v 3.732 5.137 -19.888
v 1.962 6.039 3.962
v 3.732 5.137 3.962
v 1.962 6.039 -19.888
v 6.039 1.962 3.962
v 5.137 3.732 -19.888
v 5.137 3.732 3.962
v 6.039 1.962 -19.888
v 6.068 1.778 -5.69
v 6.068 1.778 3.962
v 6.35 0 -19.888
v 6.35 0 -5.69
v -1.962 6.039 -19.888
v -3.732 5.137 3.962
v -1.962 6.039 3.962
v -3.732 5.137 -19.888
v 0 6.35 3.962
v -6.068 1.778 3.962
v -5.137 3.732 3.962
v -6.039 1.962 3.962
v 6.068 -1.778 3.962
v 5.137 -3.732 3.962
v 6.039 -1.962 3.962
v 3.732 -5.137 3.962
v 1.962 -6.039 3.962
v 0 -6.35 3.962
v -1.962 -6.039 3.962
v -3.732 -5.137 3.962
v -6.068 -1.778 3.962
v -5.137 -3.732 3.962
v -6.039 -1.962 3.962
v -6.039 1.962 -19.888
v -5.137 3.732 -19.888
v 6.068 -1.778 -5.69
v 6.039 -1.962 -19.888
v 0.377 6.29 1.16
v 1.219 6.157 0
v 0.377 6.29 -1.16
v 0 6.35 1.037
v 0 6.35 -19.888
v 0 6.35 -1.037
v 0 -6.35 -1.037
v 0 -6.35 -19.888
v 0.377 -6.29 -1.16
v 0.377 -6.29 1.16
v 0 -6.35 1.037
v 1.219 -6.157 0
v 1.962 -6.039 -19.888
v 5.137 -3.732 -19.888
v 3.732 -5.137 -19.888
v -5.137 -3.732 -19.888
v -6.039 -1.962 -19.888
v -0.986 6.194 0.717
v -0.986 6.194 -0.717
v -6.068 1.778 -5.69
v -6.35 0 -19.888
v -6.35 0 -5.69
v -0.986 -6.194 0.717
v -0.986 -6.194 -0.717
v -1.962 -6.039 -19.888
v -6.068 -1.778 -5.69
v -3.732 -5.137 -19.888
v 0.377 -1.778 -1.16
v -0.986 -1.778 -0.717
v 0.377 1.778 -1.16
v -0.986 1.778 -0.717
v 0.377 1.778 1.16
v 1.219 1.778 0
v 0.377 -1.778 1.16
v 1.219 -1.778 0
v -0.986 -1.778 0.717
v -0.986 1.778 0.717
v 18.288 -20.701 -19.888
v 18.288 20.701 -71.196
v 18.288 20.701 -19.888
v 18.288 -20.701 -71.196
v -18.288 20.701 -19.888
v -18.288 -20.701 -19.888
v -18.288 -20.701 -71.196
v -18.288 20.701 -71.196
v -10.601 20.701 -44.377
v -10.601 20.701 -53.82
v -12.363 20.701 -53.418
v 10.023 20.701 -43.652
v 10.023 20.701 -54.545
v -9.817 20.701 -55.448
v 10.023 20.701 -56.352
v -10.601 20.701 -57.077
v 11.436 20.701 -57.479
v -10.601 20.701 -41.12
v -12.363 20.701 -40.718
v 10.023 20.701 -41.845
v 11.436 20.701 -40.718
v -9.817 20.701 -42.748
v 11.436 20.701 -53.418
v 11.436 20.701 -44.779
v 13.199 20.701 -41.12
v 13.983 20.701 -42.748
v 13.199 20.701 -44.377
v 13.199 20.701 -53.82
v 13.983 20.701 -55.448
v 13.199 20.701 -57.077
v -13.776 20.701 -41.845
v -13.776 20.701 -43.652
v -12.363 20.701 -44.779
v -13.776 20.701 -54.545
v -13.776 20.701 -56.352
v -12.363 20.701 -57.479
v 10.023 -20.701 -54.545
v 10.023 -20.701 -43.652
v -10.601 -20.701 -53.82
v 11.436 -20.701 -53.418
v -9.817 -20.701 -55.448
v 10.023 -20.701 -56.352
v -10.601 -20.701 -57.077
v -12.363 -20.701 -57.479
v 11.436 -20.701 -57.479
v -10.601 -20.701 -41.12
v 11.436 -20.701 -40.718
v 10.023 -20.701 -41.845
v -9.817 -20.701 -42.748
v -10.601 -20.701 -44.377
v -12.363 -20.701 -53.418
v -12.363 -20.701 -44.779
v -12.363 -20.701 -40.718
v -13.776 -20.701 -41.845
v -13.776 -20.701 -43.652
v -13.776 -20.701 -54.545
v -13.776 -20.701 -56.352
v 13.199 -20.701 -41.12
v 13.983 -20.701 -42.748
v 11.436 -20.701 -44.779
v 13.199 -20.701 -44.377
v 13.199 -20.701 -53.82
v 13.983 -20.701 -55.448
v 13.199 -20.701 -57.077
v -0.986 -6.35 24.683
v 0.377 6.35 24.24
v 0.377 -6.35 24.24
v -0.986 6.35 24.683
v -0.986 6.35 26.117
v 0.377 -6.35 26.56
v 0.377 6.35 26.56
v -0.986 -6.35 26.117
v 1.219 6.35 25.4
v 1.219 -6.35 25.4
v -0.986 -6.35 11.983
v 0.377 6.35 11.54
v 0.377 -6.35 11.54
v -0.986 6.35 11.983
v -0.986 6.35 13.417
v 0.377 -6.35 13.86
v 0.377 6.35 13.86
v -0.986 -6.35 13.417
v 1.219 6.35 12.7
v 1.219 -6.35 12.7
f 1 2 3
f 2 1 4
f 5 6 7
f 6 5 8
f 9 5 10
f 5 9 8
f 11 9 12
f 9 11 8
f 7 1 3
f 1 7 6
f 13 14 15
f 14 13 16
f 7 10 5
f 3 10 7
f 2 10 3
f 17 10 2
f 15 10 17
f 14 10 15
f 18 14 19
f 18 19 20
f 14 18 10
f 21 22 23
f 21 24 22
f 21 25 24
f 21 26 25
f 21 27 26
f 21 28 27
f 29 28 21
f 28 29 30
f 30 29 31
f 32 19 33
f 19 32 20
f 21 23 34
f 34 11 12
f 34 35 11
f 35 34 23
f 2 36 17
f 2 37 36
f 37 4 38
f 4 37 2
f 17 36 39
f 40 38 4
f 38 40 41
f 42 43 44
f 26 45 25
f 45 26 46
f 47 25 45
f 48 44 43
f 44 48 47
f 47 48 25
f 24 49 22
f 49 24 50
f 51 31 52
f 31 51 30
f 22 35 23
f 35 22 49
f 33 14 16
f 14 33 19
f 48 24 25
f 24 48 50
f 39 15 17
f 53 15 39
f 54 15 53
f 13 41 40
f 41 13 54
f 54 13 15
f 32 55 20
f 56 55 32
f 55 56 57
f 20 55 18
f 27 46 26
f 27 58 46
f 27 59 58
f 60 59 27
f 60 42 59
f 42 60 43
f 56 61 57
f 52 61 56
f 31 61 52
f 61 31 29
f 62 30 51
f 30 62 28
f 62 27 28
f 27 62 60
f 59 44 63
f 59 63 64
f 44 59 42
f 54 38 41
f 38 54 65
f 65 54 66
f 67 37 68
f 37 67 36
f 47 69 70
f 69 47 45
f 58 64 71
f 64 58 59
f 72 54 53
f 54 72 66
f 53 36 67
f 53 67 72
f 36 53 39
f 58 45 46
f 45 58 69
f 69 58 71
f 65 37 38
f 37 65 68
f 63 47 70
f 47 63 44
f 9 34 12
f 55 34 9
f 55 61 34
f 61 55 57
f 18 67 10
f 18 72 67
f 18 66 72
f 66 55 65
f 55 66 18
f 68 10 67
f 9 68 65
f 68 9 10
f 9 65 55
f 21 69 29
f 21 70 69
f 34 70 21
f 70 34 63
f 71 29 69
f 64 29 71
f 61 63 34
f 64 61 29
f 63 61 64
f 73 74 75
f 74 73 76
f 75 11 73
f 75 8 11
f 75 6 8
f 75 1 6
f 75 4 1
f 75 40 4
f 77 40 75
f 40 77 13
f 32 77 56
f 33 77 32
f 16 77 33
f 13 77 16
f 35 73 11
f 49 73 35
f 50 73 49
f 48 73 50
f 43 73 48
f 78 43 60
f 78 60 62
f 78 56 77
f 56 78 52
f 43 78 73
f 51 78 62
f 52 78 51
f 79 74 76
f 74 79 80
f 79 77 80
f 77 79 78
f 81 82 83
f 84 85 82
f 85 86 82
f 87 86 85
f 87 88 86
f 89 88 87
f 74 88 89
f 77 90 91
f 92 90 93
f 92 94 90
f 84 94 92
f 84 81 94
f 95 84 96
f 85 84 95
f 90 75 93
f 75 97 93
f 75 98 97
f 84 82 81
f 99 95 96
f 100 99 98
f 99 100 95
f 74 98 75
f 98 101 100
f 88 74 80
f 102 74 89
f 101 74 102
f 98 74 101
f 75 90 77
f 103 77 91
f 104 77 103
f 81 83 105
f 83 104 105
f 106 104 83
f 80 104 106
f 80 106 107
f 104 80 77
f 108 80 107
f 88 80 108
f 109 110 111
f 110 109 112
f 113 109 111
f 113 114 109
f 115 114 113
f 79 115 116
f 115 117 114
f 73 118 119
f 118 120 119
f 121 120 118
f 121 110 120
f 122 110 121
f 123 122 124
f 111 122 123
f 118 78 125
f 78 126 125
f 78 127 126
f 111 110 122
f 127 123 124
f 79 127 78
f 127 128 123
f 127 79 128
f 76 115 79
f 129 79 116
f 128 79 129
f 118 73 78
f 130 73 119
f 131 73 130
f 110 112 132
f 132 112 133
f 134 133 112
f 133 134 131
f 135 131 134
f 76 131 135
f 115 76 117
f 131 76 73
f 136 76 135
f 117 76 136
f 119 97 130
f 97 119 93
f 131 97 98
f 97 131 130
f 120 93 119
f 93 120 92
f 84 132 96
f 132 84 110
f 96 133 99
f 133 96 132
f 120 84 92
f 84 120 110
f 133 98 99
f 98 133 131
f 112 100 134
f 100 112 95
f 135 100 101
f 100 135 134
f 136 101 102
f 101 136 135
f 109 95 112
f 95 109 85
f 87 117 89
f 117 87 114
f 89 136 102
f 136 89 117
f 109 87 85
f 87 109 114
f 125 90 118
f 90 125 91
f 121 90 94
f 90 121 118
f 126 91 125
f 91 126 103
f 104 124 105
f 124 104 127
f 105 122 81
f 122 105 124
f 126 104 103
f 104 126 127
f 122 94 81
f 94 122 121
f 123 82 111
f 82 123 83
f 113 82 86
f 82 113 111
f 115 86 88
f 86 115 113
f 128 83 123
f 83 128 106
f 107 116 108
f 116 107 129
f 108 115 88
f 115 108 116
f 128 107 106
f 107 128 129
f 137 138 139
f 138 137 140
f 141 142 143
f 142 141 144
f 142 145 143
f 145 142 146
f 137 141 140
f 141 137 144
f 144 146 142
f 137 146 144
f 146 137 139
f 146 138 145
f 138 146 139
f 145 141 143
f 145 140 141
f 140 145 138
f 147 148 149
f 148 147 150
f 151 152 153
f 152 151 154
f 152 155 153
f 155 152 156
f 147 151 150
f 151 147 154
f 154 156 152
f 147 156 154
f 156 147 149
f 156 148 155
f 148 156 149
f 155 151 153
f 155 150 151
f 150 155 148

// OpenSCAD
PCL04();

module PCL04(){
    
x=36.576;
y=41.402;
z=51.308;

topz=28.448;  ///distance from base to center of top mount hole
top2stroke0=42.7482;
top2stroke1=68.1482;  
plungerholeD=2.4384;
plungercutZ=9.652;
plungercutY=3.556;    
plungertop2c=3.9624;

holeOD=4.1656;
botz=topz-12.7;

D=12.7;

translate([-x/2,-y/2,-topz-top2stroke0])
difference(){
    union(){
cube([x,y,z]);
translate([x/2,y/2,topz])
    difference(){
cylinder(d=D,h=top2stroke0+plungertop2c);
translate([0,D/2,top2stroke0])
rotate([90,0,0])     
#cylinder(d=plungerholeD,h=D);     
translate([-D/2,-plungercutY/2,top2stroke0+plungertop2c-plungercutZ])
#cube([D,plungercutY,plungercutZ]);       
    }
}
translate([23.7998/2,0,0]){
translate([x/2,y,topz])
    rotate([90,0,0])
cylinder(d=holeOD,h=y);

translate([x/2,y,botz])
    rotate([90,0,0])
cylinder(d=holeOD,h=y);
}
translate([-23.7998/2,0,0]){
translate([x/2,y,topz])
    rotate([90,0,0])
cylinder(d=holeOD,h=y);

translate([x/2,y,botz])
    rotate([90,0,0])
cylinder(d=holeOD,h=y);
}


}//end main diff    

translate([0,D/2,-top2stroke0+top2stroke1])
rotate([90,0,0])     
#cylinder(d=plungerholeD,h=D);    

translate([0,D/2,(-top2stroke0+top2stroke1)/2])
rotate([90,0,0])     
#cylinder(d=plungerholeD,h=D);    

    
}//end module
